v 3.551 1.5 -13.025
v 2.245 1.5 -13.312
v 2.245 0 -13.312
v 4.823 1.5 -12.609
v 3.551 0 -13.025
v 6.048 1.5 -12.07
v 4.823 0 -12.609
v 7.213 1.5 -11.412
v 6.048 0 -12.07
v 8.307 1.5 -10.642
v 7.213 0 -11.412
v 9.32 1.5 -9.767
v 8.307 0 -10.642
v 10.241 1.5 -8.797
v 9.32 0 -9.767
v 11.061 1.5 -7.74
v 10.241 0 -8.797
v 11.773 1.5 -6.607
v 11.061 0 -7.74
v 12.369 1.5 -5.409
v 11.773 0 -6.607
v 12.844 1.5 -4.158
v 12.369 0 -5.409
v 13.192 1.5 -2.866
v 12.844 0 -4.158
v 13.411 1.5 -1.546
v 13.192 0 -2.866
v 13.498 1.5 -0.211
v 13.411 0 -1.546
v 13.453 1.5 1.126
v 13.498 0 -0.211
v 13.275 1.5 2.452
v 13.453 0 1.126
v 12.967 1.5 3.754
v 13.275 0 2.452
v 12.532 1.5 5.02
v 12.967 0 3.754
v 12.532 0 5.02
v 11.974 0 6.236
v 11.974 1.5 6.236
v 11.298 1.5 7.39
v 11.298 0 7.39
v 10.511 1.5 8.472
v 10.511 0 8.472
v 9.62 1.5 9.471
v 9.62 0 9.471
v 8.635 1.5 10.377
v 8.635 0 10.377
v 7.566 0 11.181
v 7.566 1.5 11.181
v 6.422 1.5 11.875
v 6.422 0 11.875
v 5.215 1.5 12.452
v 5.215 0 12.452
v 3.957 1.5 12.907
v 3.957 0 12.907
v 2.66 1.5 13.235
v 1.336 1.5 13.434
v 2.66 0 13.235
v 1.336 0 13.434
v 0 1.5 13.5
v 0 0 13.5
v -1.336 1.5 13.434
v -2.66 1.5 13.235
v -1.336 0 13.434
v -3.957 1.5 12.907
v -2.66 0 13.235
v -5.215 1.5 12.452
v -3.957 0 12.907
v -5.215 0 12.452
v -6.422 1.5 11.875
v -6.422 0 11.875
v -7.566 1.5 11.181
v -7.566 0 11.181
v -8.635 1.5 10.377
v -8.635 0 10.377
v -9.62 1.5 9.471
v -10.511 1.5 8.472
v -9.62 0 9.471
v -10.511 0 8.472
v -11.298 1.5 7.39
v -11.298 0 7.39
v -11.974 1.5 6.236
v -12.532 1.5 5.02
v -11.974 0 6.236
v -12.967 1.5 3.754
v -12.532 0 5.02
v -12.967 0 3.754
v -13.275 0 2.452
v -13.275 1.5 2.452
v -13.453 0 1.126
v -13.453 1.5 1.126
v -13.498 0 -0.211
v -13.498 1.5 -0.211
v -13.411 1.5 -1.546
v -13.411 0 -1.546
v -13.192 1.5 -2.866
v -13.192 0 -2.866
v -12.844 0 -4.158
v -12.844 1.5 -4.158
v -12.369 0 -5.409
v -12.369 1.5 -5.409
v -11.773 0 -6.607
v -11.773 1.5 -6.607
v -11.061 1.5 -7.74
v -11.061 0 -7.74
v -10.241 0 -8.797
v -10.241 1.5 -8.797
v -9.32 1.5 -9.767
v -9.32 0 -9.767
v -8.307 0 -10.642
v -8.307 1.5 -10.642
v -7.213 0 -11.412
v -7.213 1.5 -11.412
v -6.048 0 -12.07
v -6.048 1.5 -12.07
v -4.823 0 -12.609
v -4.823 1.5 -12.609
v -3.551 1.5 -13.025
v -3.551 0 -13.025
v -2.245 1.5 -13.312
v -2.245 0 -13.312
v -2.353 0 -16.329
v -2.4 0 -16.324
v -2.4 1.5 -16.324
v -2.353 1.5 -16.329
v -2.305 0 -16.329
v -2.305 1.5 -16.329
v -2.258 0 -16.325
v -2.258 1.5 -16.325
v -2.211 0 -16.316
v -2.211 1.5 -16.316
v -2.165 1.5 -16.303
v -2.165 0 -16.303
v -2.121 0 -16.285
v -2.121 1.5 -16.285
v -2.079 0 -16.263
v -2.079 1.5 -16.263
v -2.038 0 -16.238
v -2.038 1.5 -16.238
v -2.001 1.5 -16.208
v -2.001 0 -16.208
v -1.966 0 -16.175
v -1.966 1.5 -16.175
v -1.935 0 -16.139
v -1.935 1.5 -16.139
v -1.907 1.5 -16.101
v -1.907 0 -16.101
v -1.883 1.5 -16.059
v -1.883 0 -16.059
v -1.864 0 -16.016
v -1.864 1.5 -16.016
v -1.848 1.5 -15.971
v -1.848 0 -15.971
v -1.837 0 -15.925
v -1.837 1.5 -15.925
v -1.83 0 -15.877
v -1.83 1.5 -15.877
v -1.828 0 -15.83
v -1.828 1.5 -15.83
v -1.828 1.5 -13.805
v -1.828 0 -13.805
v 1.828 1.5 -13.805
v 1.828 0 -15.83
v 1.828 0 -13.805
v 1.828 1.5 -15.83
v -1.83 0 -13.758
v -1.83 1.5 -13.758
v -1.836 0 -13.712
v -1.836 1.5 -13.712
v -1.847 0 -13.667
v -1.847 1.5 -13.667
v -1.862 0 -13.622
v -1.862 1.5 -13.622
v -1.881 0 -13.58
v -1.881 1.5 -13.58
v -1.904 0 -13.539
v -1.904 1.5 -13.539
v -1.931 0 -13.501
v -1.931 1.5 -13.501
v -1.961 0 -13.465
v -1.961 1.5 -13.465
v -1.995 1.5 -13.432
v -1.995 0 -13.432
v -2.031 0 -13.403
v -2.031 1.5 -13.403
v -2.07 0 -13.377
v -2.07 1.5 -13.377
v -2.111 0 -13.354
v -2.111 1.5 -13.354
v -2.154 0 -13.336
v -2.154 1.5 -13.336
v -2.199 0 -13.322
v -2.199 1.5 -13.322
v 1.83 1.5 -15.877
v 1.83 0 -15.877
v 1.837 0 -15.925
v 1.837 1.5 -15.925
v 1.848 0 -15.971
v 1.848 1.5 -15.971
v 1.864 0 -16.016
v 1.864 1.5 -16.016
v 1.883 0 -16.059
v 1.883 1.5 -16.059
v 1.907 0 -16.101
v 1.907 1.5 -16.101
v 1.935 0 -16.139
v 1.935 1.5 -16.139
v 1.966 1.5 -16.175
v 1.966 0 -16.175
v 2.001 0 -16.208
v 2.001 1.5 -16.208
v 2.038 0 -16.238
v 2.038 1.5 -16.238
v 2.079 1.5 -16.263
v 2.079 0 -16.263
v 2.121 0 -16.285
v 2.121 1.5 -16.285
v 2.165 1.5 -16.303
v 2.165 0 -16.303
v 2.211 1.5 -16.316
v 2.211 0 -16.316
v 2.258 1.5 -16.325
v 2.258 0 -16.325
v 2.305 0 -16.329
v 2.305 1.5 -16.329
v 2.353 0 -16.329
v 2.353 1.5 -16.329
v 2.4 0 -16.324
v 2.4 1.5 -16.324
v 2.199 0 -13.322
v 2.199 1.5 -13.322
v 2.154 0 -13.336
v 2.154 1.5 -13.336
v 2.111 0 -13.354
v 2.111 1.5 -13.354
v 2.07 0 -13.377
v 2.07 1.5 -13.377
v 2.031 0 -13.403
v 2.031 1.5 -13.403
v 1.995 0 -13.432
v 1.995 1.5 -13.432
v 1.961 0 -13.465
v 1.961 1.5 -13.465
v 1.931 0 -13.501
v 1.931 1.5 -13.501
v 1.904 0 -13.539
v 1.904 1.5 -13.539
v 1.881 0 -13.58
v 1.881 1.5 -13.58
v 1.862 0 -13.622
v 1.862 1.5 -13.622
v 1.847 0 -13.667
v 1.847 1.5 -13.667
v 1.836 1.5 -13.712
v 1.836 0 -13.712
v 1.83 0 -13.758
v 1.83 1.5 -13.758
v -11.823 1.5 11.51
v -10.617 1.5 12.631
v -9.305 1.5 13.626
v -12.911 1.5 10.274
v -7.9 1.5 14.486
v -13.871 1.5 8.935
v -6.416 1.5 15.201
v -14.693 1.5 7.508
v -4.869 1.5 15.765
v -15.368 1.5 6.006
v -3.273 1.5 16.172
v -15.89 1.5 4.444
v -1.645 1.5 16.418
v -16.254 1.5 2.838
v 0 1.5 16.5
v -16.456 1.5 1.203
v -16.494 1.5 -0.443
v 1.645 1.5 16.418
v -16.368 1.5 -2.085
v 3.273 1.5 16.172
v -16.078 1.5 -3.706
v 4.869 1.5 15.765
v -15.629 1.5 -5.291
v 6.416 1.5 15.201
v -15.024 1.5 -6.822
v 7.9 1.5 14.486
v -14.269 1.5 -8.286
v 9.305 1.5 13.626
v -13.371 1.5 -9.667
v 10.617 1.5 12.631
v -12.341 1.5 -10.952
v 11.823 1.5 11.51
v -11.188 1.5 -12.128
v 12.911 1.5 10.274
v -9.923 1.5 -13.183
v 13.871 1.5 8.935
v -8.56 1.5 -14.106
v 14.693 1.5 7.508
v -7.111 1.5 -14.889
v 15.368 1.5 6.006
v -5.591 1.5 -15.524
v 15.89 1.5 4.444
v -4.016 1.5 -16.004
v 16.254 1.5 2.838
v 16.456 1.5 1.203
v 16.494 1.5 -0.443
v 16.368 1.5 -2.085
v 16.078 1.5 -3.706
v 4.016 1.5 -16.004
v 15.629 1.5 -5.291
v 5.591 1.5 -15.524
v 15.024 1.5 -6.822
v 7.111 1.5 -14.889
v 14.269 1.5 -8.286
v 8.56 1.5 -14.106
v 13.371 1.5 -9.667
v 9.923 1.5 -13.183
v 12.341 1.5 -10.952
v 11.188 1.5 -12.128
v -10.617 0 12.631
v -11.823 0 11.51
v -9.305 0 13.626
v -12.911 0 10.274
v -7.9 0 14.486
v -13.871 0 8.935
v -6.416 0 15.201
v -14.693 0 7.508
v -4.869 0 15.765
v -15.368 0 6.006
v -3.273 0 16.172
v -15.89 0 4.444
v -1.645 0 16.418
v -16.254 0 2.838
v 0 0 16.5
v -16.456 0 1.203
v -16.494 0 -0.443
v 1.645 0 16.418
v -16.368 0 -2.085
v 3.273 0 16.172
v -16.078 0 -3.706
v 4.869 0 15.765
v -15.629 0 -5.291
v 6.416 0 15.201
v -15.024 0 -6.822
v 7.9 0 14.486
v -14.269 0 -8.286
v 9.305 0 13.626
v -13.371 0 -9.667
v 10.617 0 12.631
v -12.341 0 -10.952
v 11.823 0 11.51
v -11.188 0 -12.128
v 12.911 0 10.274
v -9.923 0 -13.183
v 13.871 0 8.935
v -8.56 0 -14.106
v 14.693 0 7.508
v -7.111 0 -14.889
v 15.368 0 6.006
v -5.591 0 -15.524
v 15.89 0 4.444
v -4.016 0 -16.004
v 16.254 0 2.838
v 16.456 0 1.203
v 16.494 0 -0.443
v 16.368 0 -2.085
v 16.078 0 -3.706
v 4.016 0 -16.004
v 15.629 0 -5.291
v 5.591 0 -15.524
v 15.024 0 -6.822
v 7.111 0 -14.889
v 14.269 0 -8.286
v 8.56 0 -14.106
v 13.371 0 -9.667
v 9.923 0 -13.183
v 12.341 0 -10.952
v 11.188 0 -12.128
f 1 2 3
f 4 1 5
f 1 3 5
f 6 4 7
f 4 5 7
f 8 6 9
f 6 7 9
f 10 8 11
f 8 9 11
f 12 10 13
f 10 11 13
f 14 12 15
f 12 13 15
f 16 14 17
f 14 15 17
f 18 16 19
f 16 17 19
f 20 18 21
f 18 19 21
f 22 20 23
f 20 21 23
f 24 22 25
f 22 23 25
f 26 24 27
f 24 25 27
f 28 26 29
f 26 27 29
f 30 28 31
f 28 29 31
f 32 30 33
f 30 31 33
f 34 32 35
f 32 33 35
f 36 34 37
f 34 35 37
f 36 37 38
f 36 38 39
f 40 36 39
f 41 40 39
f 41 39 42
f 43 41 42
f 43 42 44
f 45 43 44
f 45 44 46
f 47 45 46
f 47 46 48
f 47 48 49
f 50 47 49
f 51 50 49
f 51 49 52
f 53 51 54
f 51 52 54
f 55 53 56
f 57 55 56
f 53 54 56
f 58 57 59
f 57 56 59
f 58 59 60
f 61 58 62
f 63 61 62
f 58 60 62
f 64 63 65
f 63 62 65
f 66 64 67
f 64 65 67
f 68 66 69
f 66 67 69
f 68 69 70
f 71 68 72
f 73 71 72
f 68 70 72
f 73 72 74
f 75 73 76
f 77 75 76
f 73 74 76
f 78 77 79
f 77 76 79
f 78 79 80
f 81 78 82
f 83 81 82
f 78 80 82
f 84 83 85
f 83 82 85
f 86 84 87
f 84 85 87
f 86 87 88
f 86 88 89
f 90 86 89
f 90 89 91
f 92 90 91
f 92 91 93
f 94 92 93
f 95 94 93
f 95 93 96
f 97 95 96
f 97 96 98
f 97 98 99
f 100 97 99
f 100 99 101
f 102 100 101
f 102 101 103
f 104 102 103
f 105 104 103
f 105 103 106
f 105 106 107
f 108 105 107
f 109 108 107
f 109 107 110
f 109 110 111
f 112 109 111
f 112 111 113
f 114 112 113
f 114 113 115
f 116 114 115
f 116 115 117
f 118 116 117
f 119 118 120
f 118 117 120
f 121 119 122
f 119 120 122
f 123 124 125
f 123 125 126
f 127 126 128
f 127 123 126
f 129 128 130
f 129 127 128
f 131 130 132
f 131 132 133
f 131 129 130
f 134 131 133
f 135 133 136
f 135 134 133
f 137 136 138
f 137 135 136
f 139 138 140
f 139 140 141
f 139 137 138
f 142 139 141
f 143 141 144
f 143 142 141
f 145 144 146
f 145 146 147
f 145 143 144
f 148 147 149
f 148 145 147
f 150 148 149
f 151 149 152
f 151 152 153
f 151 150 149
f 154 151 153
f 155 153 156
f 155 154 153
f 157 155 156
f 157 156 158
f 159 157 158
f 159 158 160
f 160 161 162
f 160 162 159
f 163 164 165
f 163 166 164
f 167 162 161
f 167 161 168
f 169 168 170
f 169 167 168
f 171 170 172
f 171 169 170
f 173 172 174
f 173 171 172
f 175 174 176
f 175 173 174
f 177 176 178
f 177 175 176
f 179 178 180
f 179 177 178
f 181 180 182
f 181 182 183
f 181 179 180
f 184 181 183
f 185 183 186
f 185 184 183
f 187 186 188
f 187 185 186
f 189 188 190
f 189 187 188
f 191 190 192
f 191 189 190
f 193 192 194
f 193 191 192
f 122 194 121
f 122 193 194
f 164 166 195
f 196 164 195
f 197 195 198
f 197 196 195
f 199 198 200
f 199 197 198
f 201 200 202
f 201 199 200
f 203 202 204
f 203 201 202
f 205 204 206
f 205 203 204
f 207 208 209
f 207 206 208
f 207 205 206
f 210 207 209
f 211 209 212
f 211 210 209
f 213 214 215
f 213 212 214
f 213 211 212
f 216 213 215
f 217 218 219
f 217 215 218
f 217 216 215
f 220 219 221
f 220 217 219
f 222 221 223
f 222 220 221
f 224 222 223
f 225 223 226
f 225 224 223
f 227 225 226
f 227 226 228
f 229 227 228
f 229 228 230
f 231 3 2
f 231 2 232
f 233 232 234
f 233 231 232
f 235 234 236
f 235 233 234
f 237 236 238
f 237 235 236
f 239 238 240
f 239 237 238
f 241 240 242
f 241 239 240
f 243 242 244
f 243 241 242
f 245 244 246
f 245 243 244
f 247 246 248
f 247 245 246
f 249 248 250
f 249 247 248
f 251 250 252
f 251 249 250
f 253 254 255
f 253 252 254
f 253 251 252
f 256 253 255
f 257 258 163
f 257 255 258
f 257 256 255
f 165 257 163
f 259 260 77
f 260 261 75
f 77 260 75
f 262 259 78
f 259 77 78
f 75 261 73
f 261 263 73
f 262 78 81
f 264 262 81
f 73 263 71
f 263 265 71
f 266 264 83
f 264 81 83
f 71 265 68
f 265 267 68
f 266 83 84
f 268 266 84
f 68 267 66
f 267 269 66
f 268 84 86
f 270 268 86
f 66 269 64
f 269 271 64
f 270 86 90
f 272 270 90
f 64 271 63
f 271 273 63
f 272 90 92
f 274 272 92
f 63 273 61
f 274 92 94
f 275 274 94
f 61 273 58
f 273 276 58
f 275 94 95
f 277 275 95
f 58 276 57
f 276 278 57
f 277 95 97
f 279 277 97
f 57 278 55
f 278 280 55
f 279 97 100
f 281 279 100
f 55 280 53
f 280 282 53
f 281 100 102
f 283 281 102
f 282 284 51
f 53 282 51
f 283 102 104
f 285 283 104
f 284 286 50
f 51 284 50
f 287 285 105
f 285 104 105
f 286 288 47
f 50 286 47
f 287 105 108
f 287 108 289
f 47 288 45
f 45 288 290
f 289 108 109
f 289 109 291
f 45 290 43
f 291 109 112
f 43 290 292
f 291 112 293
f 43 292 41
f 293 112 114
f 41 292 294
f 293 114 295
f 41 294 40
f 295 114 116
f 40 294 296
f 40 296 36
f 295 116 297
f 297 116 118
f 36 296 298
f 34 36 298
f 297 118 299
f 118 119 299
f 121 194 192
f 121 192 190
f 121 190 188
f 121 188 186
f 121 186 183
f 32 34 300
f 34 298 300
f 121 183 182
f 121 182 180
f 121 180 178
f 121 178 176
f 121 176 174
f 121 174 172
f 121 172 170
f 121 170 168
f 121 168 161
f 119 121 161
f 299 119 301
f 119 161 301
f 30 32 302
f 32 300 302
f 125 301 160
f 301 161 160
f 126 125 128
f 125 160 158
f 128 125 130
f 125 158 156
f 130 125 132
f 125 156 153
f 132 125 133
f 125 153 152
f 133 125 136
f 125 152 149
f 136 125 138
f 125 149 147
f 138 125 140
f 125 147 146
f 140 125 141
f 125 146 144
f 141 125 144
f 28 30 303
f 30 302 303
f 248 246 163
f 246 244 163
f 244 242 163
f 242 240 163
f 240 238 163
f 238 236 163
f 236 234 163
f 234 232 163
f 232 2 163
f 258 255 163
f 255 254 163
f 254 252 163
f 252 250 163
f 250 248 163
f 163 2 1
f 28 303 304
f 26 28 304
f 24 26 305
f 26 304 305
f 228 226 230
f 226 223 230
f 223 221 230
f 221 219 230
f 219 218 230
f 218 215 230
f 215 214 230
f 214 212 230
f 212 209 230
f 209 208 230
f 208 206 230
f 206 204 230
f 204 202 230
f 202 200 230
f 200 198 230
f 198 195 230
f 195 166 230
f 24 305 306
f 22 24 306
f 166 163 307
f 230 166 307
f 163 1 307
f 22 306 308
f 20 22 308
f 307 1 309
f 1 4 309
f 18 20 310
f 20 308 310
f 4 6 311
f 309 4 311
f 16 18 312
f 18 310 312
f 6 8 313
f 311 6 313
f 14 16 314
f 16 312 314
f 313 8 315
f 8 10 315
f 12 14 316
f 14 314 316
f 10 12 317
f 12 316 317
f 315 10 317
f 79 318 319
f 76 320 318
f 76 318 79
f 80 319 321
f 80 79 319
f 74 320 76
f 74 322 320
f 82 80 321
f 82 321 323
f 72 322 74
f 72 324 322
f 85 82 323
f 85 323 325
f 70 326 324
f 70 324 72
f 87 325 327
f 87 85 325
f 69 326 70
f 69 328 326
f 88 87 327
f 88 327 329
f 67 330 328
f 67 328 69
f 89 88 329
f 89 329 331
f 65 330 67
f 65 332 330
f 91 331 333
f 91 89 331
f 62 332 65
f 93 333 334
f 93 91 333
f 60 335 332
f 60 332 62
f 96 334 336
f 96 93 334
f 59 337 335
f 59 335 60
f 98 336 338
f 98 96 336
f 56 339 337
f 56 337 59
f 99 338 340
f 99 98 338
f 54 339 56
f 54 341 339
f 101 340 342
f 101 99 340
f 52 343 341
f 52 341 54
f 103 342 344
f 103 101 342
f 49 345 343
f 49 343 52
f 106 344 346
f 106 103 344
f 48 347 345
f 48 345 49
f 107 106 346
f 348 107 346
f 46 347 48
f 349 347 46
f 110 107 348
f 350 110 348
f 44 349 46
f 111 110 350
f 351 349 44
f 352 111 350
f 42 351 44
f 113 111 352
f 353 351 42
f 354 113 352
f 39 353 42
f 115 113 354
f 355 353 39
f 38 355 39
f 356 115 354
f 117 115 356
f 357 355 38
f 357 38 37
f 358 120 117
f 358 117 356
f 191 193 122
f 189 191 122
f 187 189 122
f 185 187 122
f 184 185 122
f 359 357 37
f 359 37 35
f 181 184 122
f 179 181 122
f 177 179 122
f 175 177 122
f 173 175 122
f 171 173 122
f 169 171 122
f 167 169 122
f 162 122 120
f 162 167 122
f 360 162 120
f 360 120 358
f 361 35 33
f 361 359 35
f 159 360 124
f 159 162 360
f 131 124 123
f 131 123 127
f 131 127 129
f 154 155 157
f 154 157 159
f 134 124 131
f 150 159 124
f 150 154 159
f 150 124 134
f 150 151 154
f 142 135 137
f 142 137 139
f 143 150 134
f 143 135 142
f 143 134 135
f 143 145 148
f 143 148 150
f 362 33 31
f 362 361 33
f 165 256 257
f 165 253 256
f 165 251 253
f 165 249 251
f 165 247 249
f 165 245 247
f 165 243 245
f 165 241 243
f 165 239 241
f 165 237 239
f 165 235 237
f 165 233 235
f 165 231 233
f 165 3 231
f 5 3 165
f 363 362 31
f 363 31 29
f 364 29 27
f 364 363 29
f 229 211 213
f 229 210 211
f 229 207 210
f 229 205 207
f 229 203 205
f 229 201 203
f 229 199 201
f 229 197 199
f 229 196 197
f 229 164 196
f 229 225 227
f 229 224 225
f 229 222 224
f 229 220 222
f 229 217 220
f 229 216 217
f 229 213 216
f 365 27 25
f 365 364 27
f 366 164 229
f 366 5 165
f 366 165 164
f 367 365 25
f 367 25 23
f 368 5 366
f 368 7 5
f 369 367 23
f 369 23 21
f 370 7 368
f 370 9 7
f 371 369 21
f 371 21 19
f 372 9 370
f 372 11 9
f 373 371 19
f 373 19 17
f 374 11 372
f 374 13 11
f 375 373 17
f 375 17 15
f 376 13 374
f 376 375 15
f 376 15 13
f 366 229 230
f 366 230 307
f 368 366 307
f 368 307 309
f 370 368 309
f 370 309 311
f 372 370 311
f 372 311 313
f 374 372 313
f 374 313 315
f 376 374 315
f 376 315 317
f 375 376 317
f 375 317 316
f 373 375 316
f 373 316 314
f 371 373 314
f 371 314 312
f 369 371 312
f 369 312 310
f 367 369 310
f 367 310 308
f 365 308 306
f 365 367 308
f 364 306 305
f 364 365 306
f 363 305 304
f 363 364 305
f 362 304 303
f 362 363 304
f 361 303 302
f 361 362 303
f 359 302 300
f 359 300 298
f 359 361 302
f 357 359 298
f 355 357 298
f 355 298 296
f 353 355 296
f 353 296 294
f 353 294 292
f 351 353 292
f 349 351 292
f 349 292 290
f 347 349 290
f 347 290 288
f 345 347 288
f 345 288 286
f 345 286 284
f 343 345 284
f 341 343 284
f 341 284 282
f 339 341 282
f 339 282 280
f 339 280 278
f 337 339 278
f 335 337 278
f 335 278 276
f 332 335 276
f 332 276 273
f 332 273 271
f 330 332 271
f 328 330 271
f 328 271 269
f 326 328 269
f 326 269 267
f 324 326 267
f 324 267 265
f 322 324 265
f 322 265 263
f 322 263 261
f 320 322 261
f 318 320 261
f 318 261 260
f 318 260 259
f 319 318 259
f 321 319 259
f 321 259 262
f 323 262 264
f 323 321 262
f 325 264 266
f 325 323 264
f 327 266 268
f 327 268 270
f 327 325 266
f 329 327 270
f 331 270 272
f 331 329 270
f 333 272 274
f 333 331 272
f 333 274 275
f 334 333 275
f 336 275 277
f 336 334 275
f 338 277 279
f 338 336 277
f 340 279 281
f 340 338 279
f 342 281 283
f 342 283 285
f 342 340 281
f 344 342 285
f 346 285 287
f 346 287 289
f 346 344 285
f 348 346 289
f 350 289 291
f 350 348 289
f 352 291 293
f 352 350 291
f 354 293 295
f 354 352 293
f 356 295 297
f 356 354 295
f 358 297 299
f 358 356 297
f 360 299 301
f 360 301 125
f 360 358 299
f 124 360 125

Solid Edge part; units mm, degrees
sketch "Sketch1" plane through (0, 0, 0) normal (0, -1, 0) x (1, 0, 0)
  circle A0 centre (0, 0) radius 16.5
  circle A1 centre (0, 0) radius 13.5
  dimension "D1" = 27
  dimension "D2" = 33
extrude "Protrusion1" add sketch "Sketch1" against normal blind 1.5
sketch "Sketch2" plane through (0, 1.5, 0) normal (0, 1, 0) x (1, 0, 0)
  line L0 (-1.8277, 13.3757) -> (-1.8277, 16.3985)
  arc A0 (1.8277, 16.3985) -> (-1.8277, 16.3985) centre (0, 0) ccw
  line L1 (1.8277, 16.3985) -> (1.8277, 13.3757)
  arc A1 (1.8277, 13.3757) -> (-1.8277, 13.3757) centre (0, 0) ccw
extrude "ExtrudedCutout_1" cut sketch "Sketch2" against normal blind 12.4809
fillet "Round_1" radius 0.5 4 edges at (-1.8277, 0.75, -13.3757) (-1.8277, 0.75, -16.3985) (1.8277, 0.75, -16.3985) (1.8277, 0.75, -13.3757)
